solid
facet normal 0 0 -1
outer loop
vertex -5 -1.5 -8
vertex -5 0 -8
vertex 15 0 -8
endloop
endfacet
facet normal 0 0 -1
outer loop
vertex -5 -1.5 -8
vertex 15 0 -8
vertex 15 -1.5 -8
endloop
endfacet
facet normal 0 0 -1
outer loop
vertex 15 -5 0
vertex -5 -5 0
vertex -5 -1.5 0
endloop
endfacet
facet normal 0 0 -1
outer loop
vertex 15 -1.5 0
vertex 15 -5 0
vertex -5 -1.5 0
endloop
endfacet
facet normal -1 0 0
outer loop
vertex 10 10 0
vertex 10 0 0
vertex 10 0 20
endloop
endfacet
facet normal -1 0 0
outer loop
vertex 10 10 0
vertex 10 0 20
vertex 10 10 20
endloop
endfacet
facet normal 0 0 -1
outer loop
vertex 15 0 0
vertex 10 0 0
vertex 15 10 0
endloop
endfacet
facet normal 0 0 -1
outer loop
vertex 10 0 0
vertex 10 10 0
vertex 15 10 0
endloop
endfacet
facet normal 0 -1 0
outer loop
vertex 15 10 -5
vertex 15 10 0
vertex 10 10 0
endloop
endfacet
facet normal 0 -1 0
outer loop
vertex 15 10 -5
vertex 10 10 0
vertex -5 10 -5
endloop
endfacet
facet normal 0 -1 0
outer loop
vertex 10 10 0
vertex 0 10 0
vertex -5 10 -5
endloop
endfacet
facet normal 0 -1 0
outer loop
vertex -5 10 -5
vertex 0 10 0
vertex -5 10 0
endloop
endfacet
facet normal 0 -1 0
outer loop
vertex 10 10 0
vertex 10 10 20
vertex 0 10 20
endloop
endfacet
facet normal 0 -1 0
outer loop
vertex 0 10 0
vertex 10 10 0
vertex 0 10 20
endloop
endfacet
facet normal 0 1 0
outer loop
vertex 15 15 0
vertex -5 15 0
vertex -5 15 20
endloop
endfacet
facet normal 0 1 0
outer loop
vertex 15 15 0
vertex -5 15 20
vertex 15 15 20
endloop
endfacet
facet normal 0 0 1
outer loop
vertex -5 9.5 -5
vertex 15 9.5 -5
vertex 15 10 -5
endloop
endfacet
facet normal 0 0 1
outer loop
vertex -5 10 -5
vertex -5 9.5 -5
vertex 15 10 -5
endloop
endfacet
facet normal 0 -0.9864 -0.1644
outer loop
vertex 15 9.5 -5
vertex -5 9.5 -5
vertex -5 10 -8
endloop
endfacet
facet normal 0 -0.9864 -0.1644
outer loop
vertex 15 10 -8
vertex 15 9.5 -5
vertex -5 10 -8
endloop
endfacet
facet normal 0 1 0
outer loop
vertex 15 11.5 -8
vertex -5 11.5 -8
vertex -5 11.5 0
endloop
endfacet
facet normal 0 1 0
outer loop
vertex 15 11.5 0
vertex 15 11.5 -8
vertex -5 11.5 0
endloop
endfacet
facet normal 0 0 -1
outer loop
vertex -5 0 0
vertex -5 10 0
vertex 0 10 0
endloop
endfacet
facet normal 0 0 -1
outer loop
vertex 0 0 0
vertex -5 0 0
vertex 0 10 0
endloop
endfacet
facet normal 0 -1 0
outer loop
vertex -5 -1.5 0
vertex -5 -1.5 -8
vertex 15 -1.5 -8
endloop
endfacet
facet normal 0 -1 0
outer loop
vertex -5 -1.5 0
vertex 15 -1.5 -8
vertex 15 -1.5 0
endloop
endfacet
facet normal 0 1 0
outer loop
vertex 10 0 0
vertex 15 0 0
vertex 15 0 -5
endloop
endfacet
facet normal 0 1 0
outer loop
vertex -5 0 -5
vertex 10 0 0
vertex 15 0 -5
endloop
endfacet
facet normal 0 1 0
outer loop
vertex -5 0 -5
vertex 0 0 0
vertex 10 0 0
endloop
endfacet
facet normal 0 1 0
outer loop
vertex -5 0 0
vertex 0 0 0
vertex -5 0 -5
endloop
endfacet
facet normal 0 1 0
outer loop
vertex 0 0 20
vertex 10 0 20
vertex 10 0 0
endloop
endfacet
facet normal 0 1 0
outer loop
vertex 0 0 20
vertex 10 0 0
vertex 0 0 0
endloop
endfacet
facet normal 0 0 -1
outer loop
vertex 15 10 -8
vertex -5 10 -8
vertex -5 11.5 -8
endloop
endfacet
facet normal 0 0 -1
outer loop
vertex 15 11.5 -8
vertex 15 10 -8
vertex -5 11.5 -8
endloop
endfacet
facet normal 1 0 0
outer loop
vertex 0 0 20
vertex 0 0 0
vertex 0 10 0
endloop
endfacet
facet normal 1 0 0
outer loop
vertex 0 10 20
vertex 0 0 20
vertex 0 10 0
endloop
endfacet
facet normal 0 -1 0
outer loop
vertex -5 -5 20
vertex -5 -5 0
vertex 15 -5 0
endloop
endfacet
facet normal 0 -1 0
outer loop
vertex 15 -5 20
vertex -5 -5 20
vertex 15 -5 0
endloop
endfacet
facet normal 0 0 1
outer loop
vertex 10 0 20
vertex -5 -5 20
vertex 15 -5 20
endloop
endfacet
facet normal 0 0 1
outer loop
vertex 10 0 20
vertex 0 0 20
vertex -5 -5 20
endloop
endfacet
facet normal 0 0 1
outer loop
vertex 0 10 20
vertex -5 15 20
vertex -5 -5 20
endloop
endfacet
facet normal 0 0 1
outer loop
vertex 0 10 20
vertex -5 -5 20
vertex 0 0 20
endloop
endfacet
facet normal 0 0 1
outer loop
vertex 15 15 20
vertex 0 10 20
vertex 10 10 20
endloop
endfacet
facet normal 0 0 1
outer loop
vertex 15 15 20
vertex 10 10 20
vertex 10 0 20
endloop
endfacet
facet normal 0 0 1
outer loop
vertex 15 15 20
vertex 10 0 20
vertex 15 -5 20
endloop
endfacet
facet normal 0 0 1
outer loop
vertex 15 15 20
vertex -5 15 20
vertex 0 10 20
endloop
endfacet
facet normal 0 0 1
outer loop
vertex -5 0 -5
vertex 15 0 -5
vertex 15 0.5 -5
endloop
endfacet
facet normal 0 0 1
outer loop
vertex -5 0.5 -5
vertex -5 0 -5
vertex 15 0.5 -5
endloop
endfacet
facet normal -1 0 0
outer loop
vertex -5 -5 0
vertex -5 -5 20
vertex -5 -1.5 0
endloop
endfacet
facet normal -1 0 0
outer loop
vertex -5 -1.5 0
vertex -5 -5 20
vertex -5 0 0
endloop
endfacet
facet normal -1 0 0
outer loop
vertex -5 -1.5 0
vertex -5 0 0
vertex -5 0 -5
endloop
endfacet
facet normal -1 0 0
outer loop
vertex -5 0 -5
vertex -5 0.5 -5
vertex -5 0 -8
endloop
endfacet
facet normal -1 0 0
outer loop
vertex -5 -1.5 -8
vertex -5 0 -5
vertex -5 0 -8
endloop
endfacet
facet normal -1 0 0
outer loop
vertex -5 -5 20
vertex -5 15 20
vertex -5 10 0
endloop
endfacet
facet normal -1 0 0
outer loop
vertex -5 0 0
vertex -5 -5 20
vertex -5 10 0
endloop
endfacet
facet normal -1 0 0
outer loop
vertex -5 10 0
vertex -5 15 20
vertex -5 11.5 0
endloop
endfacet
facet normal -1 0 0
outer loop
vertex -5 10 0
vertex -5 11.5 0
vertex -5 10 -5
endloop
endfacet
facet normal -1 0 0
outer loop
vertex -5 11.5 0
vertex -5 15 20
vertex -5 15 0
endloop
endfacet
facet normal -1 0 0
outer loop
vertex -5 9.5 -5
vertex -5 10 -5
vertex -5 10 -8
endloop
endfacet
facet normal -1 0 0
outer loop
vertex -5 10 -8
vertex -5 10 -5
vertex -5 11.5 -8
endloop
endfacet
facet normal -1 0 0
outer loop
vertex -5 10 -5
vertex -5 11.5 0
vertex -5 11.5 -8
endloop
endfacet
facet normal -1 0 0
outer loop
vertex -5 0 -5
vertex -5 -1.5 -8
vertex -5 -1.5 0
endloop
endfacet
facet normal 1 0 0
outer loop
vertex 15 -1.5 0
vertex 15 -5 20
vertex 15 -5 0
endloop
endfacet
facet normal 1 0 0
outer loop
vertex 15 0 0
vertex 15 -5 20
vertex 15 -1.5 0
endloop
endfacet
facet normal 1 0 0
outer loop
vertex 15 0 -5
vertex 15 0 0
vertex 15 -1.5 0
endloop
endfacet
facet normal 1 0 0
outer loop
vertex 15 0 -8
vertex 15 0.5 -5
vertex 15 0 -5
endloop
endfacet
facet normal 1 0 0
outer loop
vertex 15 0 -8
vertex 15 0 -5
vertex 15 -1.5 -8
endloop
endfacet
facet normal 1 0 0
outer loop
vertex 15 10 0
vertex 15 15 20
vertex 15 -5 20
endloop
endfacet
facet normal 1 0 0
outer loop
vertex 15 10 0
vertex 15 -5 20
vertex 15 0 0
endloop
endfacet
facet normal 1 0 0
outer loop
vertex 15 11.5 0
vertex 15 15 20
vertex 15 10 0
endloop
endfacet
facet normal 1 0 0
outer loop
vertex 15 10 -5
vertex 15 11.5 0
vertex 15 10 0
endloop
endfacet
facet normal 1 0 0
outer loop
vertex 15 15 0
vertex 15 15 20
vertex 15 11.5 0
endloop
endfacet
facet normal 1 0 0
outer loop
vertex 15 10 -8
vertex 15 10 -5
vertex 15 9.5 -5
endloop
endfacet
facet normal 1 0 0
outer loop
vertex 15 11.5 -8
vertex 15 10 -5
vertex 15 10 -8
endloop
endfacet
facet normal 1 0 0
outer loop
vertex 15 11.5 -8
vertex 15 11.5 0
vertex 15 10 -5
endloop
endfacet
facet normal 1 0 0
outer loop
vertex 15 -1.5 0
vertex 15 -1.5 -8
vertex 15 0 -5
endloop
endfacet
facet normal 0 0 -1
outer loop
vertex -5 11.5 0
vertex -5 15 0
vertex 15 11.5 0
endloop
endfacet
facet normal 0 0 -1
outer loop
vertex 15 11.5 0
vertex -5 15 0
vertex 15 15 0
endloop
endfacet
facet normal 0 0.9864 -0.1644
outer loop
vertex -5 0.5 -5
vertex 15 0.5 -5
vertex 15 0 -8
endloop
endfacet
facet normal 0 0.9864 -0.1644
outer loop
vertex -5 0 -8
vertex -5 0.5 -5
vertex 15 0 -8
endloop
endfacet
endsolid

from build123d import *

# Parameters (mm, degrees)
SKETCH_1_W          = 20
SKETCH_1_H          = 20
SKETCH_1_W_2        = 10
SKETCH_1_H_2        = 10
EXTRUDE_1_DEPTH     = 20
SKETCH_2_W          = 20
SKETCH_2_H          = 3
EXTRUDE_2_DEPTH     = 5
EXTRUDE_3_DEPTH     = 20
SKETCH_4_W          = 8
SKETCH_4_H          = 1.5
CUT_EXTRUDE_1_DEPTH = 20


with BuildPart() as part:
    # 草图1 → 凸台-拉伸1 (new body)
    with BuildSketch(Plane.XY):
        with Locations((5, 5)):
            Rectangle(SKETCH_1_W, SKETCH_1_H)
        with Locations((5, 5)):
            Rectangle(SKETCH_1_W_2, SKETCH_1_H_2, mode=Mode.SUBTRACT)
    extrude(amount=EXTRUDE_1_DEPTH)

    # 草图2 → 凸台-拉伸2 (add)
    with BuildSketch(Plane(origin=(0, 0, 0), x_dir=(-1, 0, 0), z_dir=(0, 0, -1))):
        with Locations((-5, 11.5)):
            Rectangle(SKETCH_2_W, SKETCH_2_H)
        with Locations((-5, -1.5)):
            Rectangle(SKETCH_2_W, SKETCH_2_H)
    extrude(amount=EXTRUDE_2_DEPTH)

    # 草图3 → 凸台-拉伸3 (add)
    with BuildSketch(Plane.ZY.offset(5)):
        Polygon((-5, 10), (-5, 9.5), (-8, 10), (-8, 13), (-5, 13), align=None)
        Polygon((-5, 0), (-5, 0.5), (-8, 0), (-8, -3), (-5, -3), align=None)
    extrude(amount=-EXTRUDE_3_DEPTH)

    # 草图4 → 切除-拉伸1 (cut)
    with BuildSketch(Plane.ZY.offset(5)):
        with Locations((-4, 12.25)):
            Rectangle(SKETCH_4_W, SKETCH_4_H)
        with Locations((-4, -2.25)):
            Rectangle(SKETCH_4_W, SKETCH_4_H)
    extrude(amount=-CUT_EXTRUDE_1_DEPTH, mode=Mode.SUBTRACT)


solid = part.part
